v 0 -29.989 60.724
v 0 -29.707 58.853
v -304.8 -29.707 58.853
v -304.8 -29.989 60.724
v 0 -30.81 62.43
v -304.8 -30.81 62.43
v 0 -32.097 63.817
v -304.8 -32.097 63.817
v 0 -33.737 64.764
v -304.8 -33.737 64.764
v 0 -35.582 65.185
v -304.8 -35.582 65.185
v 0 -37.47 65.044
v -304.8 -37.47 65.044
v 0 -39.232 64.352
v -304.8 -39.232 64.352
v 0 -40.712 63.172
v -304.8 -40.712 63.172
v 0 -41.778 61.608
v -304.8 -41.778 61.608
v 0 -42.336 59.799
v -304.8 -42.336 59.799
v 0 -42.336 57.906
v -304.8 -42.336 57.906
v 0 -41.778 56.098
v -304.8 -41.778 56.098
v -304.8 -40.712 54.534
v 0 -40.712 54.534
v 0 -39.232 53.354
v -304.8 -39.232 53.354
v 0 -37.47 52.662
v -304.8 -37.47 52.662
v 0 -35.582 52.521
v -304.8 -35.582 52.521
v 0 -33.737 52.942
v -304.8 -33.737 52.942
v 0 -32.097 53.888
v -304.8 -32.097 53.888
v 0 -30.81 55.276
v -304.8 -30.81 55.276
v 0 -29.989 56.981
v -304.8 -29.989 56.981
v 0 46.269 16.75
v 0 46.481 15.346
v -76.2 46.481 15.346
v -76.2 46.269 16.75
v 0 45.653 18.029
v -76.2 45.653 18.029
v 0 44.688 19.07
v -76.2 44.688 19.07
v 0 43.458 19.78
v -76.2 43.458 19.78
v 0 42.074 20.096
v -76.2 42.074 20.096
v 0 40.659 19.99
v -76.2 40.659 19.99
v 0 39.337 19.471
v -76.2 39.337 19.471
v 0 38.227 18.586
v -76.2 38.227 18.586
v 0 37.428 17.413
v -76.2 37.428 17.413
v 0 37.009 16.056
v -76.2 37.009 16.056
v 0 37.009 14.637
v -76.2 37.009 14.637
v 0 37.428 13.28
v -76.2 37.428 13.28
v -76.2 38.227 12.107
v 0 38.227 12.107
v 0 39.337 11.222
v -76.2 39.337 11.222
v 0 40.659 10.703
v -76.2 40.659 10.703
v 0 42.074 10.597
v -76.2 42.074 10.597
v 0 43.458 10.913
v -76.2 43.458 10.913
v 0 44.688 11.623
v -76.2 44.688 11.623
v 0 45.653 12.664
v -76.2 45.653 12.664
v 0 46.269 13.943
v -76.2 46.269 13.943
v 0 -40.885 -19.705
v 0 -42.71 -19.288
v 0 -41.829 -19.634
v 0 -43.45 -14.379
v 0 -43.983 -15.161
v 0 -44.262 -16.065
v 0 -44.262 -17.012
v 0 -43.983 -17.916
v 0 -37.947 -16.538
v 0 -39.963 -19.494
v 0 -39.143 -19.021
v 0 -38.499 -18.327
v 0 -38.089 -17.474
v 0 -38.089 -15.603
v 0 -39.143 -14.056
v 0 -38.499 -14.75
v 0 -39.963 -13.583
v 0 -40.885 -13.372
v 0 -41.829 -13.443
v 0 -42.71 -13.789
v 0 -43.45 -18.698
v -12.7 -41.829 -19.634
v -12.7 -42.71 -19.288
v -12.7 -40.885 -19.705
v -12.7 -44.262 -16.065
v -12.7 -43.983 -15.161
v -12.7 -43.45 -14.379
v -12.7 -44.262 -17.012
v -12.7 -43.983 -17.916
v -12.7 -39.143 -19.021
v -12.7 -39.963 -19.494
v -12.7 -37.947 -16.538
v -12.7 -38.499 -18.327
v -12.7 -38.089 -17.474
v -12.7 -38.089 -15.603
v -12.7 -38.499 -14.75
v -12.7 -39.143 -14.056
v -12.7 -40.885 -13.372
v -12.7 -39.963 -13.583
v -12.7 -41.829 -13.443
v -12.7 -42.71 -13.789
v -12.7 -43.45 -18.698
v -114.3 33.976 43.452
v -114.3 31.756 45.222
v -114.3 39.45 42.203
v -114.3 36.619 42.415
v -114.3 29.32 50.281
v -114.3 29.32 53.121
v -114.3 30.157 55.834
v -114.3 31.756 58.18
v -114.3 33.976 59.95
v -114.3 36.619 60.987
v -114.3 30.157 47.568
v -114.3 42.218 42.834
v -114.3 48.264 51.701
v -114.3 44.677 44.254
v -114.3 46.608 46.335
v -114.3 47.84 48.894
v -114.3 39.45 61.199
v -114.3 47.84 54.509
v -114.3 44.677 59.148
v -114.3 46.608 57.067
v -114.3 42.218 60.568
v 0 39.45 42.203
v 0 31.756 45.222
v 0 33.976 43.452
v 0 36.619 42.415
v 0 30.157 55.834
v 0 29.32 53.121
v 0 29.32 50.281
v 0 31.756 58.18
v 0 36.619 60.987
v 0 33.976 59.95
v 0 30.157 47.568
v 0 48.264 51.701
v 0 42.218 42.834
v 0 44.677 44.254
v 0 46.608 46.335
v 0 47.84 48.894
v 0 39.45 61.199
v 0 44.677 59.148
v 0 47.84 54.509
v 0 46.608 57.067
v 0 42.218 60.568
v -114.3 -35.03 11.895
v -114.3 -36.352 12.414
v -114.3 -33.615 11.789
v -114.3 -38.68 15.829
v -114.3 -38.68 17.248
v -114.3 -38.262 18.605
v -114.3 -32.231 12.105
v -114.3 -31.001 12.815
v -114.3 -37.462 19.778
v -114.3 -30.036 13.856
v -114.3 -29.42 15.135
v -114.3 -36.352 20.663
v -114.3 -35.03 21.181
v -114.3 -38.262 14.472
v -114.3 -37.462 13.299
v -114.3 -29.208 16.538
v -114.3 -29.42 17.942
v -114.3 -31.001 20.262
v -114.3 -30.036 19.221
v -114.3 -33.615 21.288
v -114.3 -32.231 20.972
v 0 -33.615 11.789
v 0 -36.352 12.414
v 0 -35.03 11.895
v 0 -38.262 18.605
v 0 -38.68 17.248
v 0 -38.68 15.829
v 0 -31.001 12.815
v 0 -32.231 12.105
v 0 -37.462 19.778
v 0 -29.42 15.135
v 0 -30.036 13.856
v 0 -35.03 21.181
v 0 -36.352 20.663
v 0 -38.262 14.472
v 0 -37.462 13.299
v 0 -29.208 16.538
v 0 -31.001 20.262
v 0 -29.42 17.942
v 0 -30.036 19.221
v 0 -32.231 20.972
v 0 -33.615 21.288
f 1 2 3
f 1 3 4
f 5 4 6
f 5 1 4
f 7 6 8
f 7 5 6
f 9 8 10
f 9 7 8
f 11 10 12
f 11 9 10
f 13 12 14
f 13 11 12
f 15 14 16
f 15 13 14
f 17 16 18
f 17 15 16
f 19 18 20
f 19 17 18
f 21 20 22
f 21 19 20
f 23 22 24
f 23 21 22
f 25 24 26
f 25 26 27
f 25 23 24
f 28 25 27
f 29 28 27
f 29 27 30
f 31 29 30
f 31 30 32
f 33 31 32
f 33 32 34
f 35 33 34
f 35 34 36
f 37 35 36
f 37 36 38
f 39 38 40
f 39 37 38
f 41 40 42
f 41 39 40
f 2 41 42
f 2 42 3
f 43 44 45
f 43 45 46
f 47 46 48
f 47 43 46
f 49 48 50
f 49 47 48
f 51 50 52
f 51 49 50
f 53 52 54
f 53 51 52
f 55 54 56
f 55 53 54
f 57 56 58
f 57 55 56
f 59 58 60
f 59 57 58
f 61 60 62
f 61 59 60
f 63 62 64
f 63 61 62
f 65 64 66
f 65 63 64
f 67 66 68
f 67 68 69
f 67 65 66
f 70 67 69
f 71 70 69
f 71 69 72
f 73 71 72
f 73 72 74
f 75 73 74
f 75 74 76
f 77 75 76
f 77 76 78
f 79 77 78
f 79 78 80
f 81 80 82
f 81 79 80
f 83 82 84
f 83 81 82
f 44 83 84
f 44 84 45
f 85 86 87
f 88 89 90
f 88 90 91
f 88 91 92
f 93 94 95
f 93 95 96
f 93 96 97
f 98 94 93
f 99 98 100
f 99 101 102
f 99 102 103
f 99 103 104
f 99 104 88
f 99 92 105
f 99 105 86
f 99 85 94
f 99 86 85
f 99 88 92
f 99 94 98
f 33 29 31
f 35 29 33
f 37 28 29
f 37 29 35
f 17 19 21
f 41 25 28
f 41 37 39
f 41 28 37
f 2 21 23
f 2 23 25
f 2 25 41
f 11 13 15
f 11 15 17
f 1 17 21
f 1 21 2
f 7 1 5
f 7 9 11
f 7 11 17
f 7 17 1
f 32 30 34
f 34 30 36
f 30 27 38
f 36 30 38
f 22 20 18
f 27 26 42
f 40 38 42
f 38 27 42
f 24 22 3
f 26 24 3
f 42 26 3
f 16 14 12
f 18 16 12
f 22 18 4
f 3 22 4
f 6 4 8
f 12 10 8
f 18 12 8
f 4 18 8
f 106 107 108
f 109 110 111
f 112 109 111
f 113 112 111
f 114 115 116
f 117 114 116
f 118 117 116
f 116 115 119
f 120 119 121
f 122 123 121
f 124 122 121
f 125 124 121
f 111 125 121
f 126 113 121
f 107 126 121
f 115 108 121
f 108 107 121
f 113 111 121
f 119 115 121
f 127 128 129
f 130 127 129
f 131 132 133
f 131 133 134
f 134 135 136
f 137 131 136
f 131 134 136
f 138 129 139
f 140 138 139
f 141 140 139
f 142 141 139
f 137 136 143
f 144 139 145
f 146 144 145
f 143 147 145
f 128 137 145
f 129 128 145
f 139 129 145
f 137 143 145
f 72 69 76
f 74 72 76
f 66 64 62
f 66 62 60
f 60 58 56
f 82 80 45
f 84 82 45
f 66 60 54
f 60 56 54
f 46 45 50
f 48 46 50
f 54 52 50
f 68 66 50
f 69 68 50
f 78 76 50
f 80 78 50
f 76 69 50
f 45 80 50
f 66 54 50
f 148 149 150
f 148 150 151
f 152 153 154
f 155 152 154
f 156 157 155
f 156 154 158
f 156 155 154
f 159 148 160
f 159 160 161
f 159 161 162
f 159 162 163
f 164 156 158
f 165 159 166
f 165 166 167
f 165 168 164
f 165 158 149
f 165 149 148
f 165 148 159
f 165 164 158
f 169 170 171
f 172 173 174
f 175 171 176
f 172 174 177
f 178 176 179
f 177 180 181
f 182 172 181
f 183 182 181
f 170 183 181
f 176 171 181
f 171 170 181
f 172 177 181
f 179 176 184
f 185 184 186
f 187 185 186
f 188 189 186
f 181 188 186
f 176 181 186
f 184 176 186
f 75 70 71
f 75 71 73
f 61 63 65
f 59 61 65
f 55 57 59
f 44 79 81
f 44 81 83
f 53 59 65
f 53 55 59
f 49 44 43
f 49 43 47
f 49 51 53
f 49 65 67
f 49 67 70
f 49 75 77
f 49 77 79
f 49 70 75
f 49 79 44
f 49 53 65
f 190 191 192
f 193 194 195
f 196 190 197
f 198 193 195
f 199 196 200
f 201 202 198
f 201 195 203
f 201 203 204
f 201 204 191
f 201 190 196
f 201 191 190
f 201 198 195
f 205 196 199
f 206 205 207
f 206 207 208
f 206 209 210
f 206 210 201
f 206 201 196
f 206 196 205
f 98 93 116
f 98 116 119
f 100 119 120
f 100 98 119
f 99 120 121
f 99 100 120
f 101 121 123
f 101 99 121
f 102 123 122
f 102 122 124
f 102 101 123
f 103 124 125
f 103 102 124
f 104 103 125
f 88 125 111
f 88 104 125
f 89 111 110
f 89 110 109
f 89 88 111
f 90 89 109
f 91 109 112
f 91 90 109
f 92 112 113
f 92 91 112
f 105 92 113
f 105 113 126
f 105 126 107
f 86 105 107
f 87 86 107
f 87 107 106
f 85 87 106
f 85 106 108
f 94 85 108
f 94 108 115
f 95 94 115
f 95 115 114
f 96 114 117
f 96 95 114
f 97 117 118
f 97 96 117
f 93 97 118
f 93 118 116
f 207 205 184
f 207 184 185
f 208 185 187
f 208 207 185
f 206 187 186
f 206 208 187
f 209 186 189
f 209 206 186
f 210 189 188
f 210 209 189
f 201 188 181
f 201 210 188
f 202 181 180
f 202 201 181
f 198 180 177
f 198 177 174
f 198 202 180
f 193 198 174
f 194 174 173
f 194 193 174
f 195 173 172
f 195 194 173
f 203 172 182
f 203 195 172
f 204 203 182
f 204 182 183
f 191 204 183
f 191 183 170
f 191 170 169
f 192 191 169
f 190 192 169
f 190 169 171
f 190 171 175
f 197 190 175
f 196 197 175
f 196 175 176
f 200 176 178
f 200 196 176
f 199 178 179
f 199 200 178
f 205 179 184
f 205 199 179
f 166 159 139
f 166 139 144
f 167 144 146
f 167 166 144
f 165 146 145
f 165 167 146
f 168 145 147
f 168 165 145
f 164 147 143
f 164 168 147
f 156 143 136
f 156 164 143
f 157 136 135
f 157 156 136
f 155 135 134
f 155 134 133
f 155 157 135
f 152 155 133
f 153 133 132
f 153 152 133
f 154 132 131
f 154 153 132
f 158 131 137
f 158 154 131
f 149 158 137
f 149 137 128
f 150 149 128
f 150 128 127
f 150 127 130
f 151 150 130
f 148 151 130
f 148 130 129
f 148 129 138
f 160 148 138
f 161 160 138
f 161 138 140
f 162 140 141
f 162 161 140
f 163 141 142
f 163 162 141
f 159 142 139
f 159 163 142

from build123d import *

# Parameters (mm, degrees)
F0_R     = 6.35
F1_DEPTH = 304.8
F2_R     = 9.525
F3_DEPTH = 114.3
F4_R     = 4.7625
F5_DEPTH = 114.3
F6_R     = 4.7625
F7_DEPTH = 76.2
F8_R     = 3.175
F9_DEPTH = 12.7


with BuildPart() as f1:
    # F0 (on Right) → F1 (new body)
    with BuildSketch(Plane.YZ):
        with Locations((-36.056649, 58.852796)):
            Circle(F0_R)
    extrude(amount=-F1_DEPTH)


with BuildPart() as f3:
    # F2 (on Right) → F3 (new body)
    with BuildSketch(Plane.YZ):
        with Locations((38.738549, 51.701061)):
            Circle(F2_R)
    extrude(amount=-F3_DEPTH)


with BuildPart() as f5:
    # F4 (on Right) → F5 (new body)
    with BuildSketch(Plane.YZ):
        with Locations((-33.970725, 16.53838)):
            Circle(F4_R)
    extrude(amount=-F5_DEPTH)


with BuildPart() as f7:
    # F6 (on Right) → F7 (new body)
    with BuildSketch(Plane.YZ):
        with Locations((41.718438, 15.346425)):
            Circle(F6_R)
    extrude(amount=-F7_DEPTH)


with BuildPart() as f9:
    # F8 (on Right) → F9 (new body)
    with BuildSketch(Plane.YZ):
        with Locations((-41.122459, -16.53838)):
            Circle(F8_R)
    extrude(amount=-F9_DEPTH)


solid = Compound([f1.part, f3.part, f5.part, f7.part, f9.part])
